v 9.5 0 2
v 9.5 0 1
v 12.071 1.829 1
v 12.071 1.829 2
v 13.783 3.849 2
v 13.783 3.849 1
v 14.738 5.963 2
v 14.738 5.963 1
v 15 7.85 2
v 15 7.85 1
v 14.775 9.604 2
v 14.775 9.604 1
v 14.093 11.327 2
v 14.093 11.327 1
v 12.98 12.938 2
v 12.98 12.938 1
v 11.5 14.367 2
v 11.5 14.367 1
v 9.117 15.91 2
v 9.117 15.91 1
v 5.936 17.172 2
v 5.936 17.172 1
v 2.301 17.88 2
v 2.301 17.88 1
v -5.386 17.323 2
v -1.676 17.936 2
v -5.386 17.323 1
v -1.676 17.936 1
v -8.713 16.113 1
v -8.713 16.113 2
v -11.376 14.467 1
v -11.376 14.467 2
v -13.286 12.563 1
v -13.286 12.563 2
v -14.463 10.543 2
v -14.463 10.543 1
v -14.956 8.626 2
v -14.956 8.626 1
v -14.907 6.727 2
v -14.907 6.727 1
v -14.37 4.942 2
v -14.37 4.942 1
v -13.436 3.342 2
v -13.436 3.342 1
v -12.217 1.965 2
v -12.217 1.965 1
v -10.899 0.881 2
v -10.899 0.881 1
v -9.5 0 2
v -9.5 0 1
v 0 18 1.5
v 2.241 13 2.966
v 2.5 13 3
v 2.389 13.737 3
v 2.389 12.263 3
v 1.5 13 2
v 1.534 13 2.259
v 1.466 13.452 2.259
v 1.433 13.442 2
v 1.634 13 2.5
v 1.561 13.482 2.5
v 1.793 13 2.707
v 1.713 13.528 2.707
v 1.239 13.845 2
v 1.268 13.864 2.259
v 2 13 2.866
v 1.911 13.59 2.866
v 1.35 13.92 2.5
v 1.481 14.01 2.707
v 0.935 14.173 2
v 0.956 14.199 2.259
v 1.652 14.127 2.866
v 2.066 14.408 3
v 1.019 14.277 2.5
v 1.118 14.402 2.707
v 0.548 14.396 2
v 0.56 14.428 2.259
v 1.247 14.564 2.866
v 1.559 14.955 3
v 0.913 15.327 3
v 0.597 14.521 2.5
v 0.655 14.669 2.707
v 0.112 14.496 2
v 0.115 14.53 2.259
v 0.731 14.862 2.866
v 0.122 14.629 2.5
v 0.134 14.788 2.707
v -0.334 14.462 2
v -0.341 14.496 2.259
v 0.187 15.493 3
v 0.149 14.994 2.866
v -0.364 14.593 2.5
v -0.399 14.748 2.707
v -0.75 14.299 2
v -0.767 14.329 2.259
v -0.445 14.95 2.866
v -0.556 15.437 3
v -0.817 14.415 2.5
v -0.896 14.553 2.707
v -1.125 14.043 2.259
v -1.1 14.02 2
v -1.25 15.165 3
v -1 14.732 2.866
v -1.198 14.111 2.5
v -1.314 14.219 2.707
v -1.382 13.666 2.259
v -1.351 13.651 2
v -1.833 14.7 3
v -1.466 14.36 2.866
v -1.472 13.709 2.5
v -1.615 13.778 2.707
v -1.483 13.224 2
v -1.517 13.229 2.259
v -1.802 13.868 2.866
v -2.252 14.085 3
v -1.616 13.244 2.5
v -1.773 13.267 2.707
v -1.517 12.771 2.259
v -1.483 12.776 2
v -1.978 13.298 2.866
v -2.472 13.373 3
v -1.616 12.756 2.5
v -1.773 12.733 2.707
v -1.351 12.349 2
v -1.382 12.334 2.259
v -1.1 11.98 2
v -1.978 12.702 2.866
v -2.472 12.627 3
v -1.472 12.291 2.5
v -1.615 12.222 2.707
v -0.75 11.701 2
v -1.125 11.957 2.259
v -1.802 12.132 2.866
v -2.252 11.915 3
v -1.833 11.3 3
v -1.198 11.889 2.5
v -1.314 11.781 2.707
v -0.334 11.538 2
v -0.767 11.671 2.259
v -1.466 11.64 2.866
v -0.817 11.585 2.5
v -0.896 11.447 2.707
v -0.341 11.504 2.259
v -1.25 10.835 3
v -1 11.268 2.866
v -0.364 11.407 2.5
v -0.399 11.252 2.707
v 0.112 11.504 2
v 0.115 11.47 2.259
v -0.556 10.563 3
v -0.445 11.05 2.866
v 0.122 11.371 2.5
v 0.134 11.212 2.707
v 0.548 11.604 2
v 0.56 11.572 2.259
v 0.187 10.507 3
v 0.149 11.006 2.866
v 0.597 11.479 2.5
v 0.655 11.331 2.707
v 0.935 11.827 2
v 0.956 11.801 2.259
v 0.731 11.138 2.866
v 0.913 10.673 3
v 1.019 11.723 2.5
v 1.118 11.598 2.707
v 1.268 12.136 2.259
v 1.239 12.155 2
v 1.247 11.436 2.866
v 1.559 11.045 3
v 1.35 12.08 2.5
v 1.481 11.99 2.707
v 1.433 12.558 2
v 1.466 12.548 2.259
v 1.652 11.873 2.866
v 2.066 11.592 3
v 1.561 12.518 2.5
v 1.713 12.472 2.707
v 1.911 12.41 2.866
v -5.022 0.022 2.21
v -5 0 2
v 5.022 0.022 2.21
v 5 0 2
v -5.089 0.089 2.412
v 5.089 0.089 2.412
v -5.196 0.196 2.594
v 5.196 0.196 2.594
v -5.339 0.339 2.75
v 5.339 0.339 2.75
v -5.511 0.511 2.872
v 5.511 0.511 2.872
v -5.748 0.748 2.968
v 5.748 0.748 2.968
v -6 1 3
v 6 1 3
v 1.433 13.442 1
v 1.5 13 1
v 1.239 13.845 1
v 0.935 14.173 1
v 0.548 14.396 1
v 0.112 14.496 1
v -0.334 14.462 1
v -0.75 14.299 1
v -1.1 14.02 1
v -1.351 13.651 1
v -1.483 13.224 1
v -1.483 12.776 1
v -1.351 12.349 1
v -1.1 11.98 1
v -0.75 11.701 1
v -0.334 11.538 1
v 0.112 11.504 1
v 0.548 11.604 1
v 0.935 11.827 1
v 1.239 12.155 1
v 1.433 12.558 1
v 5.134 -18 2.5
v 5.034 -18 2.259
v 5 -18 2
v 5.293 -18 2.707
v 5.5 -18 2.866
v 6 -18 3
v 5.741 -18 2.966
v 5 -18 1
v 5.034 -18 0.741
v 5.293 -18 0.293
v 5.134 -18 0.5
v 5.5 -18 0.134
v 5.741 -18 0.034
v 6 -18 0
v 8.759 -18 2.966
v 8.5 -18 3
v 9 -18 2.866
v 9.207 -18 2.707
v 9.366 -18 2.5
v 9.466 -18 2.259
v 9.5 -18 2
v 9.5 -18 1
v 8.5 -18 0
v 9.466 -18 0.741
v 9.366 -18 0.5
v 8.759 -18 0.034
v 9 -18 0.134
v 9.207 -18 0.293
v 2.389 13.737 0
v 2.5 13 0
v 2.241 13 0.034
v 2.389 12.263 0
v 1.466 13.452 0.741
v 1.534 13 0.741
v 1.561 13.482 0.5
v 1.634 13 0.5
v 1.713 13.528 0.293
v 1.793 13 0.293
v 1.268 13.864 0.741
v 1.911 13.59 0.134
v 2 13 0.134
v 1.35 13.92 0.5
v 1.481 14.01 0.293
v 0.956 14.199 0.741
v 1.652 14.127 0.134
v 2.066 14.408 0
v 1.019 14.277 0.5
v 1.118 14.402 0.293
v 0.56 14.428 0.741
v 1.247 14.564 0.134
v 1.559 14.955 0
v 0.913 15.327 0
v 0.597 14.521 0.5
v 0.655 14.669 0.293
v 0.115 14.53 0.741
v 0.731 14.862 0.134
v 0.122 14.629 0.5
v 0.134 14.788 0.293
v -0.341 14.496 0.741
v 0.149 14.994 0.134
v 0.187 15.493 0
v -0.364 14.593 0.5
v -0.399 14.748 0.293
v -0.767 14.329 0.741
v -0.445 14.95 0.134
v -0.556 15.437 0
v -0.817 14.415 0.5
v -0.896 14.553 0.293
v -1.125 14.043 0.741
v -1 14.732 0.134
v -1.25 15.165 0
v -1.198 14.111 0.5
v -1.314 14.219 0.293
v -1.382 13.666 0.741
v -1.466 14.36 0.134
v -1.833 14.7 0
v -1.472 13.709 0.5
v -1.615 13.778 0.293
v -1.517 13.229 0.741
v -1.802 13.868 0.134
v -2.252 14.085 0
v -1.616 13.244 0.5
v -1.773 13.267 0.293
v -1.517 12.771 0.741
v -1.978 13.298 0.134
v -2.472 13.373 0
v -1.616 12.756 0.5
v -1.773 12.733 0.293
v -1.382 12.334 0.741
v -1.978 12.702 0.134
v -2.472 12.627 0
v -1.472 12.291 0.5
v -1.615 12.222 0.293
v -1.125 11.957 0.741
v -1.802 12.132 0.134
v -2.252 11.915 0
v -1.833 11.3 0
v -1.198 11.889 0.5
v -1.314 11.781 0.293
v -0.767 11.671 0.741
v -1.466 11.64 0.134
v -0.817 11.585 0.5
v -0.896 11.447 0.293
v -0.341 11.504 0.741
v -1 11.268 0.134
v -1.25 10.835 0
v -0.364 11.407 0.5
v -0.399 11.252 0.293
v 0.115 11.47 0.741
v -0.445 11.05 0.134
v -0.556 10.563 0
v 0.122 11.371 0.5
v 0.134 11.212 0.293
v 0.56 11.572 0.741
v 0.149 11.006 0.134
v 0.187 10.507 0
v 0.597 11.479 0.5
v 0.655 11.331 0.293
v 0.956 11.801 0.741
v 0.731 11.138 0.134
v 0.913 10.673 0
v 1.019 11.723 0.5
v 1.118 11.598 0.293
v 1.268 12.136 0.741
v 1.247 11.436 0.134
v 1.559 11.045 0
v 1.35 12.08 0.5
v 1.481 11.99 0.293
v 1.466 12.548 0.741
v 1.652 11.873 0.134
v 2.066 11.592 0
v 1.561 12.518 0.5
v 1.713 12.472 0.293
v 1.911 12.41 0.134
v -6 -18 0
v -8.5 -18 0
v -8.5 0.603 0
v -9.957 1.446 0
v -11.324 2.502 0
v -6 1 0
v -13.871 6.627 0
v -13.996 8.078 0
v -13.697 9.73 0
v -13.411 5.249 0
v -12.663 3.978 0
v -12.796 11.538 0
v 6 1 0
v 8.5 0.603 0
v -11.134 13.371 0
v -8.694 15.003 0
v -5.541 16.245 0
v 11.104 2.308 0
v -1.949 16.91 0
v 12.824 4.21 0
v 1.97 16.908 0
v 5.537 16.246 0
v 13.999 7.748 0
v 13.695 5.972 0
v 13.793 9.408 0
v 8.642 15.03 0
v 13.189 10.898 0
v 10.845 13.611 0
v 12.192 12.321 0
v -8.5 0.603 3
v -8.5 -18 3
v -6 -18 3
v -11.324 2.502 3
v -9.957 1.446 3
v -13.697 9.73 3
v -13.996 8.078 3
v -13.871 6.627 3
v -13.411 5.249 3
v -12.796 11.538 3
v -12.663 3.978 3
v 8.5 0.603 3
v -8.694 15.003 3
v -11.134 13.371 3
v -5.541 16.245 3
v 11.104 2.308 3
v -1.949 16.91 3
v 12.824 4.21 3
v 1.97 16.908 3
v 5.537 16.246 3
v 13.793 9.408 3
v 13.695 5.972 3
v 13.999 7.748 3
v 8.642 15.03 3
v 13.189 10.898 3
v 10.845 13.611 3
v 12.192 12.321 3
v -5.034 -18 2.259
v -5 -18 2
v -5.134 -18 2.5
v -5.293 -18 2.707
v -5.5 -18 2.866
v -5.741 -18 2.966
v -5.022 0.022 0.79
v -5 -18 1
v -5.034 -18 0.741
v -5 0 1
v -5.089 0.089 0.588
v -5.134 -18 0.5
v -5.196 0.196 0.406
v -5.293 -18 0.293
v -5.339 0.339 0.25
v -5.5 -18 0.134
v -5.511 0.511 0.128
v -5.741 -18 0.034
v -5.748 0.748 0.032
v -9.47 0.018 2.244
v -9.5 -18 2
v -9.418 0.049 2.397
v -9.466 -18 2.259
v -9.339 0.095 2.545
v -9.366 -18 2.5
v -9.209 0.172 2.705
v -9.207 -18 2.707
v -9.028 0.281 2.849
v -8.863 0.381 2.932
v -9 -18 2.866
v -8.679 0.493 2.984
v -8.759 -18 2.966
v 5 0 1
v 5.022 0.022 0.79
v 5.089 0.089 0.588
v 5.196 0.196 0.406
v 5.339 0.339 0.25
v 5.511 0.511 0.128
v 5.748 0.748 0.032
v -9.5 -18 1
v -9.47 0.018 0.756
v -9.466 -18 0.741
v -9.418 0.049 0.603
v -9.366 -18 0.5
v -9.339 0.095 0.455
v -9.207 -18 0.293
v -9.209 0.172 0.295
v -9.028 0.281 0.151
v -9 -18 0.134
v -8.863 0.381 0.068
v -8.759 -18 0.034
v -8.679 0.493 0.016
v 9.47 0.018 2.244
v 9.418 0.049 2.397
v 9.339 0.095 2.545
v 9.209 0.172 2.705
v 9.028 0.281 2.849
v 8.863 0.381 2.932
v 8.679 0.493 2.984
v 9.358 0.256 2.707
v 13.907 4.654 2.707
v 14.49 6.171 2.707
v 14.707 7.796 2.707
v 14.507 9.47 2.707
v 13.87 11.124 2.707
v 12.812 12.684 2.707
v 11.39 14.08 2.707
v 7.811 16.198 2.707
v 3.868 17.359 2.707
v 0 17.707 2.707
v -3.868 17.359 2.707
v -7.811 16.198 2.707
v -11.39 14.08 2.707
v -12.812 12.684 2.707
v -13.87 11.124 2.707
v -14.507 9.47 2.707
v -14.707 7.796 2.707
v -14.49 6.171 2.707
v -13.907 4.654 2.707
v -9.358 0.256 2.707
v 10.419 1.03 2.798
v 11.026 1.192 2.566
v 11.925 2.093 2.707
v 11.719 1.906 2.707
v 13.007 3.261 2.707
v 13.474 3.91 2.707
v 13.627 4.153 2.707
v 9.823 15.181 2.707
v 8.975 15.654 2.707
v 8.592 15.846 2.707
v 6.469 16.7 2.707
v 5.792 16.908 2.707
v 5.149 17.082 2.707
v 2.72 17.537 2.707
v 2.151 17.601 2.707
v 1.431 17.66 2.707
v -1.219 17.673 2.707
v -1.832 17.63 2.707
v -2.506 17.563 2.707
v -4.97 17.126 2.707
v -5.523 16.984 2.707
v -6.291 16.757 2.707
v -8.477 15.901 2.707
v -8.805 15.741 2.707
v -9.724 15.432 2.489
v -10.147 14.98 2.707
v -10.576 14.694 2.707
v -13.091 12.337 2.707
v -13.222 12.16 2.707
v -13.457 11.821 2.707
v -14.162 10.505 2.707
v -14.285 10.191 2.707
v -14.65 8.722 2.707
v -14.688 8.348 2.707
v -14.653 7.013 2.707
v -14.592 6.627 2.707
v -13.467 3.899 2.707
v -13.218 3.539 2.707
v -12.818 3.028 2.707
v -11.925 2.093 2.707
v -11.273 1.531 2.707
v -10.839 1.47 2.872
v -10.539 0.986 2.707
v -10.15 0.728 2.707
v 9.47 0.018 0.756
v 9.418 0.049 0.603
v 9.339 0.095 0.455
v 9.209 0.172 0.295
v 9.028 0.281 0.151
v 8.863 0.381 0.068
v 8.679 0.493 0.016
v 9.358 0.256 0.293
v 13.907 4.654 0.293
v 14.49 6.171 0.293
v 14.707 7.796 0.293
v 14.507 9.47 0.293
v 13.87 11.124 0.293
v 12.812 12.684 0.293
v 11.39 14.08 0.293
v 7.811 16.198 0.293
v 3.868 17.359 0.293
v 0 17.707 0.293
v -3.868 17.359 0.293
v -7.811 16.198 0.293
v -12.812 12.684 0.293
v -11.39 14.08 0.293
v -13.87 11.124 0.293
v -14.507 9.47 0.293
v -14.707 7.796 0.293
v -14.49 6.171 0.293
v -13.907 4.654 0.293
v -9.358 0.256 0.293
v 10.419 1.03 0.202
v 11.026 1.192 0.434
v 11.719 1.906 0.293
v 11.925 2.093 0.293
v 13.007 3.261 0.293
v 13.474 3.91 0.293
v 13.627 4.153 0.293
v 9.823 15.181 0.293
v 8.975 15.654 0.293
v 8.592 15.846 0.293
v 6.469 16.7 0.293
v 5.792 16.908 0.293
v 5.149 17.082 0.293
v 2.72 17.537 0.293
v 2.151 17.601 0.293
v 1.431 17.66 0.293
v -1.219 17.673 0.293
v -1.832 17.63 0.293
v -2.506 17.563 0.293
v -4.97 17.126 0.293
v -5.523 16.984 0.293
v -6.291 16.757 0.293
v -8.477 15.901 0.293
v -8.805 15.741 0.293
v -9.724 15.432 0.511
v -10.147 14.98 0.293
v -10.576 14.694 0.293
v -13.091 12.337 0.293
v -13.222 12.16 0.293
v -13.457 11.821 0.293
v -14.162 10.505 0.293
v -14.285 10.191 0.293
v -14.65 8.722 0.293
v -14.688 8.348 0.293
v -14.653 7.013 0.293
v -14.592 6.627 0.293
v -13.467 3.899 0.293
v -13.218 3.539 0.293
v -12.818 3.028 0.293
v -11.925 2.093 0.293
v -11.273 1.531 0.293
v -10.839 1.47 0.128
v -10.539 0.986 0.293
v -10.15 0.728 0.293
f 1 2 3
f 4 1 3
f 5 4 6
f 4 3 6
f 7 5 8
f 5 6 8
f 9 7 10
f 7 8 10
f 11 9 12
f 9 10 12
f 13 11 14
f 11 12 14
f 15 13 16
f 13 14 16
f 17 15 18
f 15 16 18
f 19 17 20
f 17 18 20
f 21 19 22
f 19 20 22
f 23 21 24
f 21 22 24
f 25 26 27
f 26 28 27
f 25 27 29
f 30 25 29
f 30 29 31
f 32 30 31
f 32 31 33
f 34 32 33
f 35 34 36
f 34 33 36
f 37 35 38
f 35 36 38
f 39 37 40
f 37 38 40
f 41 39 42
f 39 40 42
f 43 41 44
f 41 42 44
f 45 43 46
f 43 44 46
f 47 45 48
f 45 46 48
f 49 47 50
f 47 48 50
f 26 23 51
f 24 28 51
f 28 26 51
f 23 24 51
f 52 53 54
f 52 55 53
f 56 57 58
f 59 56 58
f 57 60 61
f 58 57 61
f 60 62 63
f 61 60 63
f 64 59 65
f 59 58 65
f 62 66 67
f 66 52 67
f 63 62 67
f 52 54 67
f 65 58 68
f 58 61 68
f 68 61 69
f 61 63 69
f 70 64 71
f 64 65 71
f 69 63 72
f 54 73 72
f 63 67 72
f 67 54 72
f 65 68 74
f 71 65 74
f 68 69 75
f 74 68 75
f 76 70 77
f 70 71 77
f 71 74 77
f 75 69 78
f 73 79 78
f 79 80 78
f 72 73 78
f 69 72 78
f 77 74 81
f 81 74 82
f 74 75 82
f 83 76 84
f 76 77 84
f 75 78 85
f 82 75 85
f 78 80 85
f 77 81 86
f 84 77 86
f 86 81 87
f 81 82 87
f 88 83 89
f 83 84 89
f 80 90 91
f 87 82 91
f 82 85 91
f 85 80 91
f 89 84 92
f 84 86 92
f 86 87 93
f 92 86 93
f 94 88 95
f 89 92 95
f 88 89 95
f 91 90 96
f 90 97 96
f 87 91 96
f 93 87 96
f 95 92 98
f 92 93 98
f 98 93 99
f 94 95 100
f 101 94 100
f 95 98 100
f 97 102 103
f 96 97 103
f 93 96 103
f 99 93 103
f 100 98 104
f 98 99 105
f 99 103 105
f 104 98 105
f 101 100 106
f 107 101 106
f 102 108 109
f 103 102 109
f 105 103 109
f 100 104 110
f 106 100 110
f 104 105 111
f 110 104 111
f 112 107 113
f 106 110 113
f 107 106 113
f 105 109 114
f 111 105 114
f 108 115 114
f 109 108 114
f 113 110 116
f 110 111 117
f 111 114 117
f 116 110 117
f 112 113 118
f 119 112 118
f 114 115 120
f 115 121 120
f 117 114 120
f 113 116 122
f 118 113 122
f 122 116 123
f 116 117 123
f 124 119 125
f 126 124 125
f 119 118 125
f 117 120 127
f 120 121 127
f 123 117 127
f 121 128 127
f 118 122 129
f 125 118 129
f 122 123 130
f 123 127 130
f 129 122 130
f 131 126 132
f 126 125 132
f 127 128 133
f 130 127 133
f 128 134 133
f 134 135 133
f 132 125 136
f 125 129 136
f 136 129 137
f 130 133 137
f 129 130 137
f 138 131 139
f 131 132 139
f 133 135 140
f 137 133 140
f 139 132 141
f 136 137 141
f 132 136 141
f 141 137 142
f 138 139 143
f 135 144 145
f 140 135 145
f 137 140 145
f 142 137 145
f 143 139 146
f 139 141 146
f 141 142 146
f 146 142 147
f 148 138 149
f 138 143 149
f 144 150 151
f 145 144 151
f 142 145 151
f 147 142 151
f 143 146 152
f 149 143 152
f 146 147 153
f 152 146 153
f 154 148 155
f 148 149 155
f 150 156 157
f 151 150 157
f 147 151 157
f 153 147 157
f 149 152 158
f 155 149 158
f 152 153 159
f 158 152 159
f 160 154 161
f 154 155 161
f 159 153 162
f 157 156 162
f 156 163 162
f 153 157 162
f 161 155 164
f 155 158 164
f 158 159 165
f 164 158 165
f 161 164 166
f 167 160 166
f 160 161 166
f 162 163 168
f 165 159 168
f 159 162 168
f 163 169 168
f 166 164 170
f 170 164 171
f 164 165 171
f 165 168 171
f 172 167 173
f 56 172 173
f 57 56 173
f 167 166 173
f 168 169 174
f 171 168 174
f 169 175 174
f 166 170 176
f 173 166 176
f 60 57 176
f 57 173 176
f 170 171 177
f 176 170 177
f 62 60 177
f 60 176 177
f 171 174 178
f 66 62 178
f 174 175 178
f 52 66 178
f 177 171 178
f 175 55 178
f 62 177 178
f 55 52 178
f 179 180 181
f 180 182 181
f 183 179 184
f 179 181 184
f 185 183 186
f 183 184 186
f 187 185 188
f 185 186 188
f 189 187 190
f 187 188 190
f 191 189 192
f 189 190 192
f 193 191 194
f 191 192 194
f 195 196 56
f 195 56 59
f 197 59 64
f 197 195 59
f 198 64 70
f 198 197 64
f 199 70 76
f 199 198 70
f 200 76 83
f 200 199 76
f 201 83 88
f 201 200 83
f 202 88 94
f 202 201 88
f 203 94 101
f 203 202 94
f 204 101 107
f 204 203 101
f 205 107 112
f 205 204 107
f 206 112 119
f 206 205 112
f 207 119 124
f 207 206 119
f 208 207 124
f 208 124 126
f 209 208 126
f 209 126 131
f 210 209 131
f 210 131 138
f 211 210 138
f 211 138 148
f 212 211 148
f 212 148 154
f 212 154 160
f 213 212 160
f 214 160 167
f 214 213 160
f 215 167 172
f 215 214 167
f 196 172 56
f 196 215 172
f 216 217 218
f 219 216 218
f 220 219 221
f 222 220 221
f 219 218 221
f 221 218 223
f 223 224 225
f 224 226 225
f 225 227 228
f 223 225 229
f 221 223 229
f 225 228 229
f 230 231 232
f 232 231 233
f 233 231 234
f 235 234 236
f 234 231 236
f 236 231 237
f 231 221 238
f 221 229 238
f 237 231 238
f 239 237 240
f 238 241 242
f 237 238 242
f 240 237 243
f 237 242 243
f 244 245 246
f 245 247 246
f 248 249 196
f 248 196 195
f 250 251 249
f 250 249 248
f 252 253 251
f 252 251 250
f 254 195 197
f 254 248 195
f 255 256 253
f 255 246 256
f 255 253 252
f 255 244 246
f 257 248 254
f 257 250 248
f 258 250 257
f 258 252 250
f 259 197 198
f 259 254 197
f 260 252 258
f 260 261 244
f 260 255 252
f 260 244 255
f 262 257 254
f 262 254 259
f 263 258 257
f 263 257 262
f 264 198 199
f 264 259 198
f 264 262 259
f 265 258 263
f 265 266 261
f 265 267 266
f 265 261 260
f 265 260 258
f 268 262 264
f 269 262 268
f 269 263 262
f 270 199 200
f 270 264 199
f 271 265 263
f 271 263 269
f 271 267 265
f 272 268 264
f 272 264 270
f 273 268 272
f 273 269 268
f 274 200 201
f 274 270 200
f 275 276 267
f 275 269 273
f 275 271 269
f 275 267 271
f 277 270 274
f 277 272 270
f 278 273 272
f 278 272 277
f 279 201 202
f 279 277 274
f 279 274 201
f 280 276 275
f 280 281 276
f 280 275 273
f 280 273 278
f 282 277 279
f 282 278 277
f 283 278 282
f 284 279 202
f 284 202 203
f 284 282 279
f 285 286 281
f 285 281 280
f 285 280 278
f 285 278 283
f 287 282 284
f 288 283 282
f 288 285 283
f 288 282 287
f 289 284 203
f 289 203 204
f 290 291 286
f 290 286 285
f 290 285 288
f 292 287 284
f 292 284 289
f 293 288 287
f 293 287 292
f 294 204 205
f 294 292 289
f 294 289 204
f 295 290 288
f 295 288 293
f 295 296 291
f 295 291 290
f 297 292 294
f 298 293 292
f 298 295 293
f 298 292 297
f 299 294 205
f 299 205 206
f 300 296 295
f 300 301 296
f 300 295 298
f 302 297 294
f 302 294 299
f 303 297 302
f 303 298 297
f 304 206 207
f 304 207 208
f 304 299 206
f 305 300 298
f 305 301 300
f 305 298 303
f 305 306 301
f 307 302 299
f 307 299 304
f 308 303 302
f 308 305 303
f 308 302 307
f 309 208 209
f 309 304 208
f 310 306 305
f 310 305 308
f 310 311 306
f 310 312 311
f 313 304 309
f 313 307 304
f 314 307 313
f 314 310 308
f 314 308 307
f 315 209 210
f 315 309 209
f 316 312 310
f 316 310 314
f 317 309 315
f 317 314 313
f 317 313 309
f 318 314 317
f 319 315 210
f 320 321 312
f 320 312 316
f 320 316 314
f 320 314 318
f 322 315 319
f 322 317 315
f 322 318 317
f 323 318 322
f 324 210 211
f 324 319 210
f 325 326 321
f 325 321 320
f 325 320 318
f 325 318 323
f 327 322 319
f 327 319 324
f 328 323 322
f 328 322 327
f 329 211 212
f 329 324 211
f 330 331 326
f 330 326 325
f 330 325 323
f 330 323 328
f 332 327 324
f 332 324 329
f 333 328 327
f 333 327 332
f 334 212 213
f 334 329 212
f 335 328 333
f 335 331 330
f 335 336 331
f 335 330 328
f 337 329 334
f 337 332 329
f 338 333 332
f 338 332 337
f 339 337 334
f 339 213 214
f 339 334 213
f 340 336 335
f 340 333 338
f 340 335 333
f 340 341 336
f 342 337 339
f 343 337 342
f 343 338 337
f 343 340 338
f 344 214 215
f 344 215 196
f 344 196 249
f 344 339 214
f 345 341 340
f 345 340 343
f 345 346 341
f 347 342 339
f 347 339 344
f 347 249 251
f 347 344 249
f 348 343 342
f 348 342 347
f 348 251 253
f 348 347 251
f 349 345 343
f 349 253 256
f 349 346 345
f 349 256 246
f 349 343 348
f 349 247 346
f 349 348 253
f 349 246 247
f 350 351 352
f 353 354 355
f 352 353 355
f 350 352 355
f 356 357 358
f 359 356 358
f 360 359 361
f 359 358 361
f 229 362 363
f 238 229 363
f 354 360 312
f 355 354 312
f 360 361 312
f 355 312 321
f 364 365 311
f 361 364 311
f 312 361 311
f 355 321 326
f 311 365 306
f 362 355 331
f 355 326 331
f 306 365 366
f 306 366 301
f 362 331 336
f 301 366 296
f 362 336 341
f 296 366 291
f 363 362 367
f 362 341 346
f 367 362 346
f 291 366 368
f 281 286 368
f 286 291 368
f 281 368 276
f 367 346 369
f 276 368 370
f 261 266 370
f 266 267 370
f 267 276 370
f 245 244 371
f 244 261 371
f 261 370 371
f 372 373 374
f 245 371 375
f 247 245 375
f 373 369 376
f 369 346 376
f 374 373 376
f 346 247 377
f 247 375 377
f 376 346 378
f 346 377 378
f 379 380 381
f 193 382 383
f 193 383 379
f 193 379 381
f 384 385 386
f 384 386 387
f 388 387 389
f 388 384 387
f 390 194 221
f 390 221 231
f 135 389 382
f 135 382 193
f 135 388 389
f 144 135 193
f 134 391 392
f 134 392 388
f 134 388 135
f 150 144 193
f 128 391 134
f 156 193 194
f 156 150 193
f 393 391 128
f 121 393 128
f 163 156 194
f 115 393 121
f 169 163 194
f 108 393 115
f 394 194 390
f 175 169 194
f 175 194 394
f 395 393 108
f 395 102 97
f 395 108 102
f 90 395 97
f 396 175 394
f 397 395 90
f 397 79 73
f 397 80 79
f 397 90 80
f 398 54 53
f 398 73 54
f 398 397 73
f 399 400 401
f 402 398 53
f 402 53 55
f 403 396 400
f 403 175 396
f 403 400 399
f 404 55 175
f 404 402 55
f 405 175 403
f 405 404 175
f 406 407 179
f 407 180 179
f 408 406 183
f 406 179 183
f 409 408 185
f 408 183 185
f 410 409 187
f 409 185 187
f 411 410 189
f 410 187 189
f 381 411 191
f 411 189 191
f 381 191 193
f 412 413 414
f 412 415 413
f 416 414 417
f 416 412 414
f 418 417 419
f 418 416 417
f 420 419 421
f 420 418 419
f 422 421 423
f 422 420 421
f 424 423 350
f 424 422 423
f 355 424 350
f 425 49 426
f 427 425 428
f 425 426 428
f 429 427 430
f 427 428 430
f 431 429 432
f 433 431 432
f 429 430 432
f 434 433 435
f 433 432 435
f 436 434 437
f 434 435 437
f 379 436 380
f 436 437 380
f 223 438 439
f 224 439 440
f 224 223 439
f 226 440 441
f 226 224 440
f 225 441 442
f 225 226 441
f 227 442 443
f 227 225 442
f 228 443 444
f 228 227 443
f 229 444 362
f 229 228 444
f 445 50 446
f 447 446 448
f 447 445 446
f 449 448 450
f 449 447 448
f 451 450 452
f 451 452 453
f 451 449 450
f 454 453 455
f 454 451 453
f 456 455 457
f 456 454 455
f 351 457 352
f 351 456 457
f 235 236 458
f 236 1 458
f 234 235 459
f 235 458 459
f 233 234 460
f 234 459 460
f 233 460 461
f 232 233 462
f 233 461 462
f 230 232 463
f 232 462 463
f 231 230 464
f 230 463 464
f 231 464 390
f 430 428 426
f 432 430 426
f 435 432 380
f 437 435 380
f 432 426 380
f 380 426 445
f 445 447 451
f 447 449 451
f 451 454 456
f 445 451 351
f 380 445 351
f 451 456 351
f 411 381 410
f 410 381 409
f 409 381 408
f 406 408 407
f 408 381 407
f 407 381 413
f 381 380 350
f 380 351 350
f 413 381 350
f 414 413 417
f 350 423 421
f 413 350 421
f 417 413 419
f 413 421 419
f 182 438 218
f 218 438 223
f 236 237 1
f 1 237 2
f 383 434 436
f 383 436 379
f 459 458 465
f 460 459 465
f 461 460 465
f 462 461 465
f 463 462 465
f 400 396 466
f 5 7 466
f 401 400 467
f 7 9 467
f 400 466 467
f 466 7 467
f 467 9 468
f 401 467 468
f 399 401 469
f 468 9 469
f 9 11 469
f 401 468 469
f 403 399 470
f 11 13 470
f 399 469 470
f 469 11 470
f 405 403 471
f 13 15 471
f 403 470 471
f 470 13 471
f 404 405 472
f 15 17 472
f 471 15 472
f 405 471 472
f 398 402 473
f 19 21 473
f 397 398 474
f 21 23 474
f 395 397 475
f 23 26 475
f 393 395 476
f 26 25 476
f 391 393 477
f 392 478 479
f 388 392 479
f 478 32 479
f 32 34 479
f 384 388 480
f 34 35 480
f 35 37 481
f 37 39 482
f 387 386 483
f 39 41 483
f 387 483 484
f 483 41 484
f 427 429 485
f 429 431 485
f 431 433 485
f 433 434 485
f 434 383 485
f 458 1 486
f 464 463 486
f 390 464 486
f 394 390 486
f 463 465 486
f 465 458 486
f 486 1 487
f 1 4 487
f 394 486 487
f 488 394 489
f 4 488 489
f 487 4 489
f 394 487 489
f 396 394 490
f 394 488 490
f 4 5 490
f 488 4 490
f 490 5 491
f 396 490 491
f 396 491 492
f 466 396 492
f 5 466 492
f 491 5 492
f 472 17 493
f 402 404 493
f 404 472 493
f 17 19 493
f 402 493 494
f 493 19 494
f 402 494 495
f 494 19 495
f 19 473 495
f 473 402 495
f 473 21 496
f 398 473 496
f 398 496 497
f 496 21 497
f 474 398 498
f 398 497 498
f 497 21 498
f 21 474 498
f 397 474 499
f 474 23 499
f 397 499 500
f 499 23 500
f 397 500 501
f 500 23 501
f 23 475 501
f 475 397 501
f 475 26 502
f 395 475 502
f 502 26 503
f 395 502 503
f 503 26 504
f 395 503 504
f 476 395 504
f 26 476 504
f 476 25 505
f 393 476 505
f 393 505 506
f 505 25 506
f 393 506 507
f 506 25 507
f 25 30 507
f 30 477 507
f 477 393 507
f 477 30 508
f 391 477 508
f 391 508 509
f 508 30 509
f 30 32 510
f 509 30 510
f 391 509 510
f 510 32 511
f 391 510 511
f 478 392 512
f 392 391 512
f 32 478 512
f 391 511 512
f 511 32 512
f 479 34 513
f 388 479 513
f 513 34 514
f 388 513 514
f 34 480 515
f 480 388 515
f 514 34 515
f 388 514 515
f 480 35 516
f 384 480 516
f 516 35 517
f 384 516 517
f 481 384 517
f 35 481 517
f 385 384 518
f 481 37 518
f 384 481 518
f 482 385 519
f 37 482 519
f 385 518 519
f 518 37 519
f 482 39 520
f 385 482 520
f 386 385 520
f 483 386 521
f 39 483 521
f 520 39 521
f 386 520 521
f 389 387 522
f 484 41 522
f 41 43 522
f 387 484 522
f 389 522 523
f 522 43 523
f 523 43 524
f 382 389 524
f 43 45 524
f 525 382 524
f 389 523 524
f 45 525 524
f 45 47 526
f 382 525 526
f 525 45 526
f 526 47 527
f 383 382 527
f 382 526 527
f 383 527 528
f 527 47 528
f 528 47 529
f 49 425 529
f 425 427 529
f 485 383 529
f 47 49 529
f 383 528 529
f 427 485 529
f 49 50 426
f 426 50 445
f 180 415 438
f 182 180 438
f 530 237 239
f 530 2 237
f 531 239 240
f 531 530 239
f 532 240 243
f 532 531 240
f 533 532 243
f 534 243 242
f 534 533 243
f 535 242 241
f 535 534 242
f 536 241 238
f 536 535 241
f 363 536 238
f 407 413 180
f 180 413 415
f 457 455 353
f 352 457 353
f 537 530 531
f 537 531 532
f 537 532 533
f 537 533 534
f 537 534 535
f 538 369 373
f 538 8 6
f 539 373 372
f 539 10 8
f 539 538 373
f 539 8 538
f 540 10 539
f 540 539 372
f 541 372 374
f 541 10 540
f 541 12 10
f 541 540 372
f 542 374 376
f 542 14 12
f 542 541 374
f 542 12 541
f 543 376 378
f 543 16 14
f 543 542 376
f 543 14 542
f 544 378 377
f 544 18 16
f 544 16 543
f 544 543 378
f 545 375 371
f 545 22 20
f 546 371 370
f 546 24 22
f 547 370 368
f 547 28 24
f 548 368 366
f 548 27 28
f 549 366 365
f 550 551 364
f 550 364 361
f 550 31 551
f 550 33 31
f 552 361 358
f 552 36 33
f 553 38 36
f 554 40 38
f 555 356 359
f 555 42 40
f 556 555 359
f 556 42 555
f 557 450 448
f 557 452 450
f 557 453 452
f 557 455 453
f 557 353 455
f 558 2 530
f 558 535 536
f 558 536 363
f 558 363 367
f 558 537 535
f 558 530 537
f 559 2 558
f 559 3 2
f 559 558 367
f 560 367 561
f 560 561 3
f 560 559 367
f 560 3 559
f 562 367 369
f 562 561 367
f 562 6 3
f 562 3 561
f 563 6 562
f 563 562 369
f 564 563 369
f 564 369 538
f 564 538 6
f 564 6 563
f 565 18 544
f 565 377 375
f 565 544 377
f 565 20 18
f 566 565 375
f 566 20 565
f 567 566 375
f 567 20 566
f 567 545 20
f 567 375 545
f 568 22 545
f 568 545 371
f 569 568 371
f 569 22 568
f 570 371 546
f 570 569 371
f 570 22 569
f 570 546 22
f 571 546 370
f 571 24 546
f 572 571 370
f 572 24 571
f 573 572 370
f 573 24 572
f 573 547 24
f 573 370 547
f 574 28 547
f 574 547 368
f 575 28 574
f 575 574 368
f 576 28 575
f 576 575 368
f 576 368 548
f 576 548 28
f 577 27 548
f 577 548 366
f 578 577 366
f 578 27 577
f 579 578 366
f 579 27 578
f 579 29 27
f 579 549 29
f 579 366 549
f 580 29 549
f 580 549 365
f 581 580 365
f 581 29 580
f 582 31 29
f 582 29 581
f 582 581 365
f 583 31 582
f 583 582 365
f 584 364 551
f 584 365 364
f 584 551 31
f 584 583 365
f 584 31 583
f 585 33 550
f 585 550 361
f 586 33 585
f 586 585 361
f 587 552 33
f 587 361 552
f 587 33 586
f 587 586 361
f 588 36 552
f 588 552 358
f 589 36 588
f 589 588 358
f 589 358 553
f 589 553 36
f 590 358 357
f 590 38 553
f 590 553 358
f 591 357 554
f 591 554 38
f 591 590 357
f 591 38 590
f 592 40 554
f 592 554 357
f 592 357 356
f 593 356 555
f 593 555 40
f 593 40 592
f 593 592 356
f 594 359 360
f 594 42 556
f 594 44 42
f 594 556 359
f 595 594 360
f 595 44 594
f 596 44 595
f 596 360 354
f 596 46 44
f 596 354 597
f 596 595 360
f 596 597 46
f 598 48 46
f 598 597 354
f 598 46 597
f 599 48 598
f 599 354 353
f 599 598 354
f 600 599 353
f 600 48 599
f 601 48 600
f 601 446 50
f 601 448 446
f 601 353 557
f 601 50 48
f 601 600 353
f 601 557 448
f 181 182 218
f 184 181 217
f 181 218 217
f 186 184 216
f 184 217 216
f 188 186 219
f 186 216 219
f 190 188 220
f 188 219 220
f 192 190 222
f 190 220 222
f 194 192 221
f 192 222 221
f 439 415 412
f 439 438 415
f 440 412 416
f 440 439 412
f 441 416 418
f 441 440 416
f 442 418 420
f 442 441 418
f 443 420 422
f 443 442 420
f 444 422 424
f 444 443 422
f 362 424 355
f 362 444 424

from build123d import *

# Parameters (mm, degrees)
SKETCH_R  = 1.5
PAD_DEPTH = 3
FILLET_R  = 1


with BuildPart() as part:
    # Sketch → Pad (new body)
    with BuildSketch(Plane.XY):
        with BuildLine():
            Line((-9.5, 0), (-9.5, -18))
            Line((-9.5, -18), (-5, -18))
            Line((-5, -18), (-5, 0))
            Line((-5, 0), (5, 0))
            Line((5, 0), (5, -18))
            Line((5, -18), (9.5, -18))
            Line((9.5, -18), (9.5, 0))
            add(Edge.make_bspline(
                [(9.5, 0), (42.012926, 18), (0, 18), (-42.012926, 18), (-9.5, 0)],
                knots=[5.398242, 5.398242, 5.398242, 7.853982, 7.853982, 10.309721, 10.309721, 10.309721], degree=2, weights=[1, 0.336245, 1, 0.336245, 1]))
        make_face()
        with Locations((0, 13)):
            Circle(SKETCH_R, mode=Mode.SUBTRACT)
    extrude(amount=PAD_DEPTH)

    # Fillet
    fillet_edges = [part.edges().sort_by_distance(p)[0] for p in [
        (-9.5, -9, 3),
        (-5, -9, 3),
        (0, 0, 3),
        (5, -9, 3),
        (-0.000491, 18, 3),
        (9.5, -9, 3),
        (-1.5, 13, 3),
        (-0.000491, 18, 0),
        (-1.5, 13, 0),
        (-9.5, -9, 0),
        (-5, -9, 0),
        (0, 0, 0),
        (5, -9, 0),
        (9.5, -9, 0),
    ]]
    fillet(fillet_edges, radius=FILLET_R)


solid = part.part
